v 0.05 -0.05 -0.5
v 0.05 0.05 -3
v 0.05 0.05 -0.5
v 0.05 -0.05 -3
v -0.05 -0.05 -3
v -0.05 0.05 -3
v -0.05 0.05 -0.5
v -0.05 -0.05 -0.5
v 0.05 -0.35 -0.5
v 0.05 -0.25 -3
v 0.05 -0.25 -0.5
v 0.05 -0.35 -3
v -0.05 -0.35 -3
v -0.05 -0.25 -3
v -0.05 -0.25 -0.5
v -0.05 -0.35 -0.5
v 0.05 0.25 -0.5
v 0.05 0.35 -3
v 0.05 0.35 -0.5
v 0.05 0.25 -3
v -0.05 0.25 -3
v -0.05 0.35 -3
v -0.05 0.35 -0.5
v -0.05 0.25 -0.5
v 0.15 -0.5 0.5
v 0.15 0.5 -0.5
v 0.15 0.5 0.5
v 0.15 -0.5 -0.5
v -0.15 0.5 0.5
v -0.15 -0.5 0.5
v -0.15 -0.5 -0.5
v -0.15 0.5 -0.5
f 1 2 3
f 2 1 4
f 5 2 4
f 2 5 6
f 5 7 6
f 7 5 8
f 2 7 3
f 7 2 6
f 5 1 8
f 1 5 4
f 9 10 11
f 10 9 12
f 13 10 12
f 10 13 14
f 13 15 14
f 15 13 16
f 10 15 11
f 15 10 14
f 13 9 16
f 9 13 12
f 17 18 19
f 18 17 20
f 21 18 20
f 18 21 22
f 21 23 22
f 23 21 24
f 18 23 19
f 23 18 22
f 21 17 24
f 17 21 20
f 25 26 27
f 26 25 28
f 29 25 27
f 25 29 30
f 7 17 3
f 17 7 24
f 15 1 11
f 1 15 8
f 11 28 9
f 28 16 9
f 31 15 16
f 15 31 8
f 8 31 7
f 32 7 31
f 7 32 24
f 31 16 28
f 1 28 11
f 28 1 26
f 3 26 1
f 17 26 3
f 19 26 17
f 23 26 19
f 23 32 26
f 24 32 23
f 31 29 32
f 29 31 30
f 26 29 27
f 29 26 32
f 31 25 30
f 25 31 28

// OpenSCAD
module Transistor(){ 
    color("black")  
    cube([0.3,1,1], center = true);

    color("gray"){  
    translate([0,0,-1.5])
    cube([0.1,0.1,3], center = true);

    translate([0,-0.3,-1.5])
    cube([0.1,0.1,3], center = true);

    translate([0,0.3,-1.5])
    cube([0.1,0.1,3], center = true);
    }
}


Transistor();


// Written by Nicolì Angelo (Gengio) 2024: 
// MIT License

//Permission is hereby granted, free of charge, to any person obtaining a copy of this software and associated documentation files (the "Software"), to deal in the Software without restriction, including without limitation the rights to use, copy, modify, merge, publish, distribute, sublicense, and/or sell copies of the Software, and to permit persons to whom the Software is furnished to do so, subject to the following conditions:

//The above copyright notice and this permission notice shall be included in all copies or substantial portions of the Software.

//THE SOFTWARE IS PROVIDED "AS IS", WITHOUT WARRANTY OF ANY KIND, EXPRESS OR IMPLIED, INCLUDING BUT NOT LIMITED TO THE WARRANTIES OF MERCHANTABILITY, FITNESS FOR A PARTICULAR PURPOSE AND NONINFRINGEMENT. IN NO EVENT SHALL THE AUTHORS OR COPYRIGHT HOLDERS BE LIABLE FOR ANY CLAIM, DAMAGES OR OTHER LIABILITY, WHETHER IN AN ACTION OF CONTRACT, TORT OR OTHERWISE, ARISING FROM, OUT OF OR IN CONNECTION WITH THE SOFTWARE OR THE USE OR OTHER DEALINGS IN THE SOFTWARE.
